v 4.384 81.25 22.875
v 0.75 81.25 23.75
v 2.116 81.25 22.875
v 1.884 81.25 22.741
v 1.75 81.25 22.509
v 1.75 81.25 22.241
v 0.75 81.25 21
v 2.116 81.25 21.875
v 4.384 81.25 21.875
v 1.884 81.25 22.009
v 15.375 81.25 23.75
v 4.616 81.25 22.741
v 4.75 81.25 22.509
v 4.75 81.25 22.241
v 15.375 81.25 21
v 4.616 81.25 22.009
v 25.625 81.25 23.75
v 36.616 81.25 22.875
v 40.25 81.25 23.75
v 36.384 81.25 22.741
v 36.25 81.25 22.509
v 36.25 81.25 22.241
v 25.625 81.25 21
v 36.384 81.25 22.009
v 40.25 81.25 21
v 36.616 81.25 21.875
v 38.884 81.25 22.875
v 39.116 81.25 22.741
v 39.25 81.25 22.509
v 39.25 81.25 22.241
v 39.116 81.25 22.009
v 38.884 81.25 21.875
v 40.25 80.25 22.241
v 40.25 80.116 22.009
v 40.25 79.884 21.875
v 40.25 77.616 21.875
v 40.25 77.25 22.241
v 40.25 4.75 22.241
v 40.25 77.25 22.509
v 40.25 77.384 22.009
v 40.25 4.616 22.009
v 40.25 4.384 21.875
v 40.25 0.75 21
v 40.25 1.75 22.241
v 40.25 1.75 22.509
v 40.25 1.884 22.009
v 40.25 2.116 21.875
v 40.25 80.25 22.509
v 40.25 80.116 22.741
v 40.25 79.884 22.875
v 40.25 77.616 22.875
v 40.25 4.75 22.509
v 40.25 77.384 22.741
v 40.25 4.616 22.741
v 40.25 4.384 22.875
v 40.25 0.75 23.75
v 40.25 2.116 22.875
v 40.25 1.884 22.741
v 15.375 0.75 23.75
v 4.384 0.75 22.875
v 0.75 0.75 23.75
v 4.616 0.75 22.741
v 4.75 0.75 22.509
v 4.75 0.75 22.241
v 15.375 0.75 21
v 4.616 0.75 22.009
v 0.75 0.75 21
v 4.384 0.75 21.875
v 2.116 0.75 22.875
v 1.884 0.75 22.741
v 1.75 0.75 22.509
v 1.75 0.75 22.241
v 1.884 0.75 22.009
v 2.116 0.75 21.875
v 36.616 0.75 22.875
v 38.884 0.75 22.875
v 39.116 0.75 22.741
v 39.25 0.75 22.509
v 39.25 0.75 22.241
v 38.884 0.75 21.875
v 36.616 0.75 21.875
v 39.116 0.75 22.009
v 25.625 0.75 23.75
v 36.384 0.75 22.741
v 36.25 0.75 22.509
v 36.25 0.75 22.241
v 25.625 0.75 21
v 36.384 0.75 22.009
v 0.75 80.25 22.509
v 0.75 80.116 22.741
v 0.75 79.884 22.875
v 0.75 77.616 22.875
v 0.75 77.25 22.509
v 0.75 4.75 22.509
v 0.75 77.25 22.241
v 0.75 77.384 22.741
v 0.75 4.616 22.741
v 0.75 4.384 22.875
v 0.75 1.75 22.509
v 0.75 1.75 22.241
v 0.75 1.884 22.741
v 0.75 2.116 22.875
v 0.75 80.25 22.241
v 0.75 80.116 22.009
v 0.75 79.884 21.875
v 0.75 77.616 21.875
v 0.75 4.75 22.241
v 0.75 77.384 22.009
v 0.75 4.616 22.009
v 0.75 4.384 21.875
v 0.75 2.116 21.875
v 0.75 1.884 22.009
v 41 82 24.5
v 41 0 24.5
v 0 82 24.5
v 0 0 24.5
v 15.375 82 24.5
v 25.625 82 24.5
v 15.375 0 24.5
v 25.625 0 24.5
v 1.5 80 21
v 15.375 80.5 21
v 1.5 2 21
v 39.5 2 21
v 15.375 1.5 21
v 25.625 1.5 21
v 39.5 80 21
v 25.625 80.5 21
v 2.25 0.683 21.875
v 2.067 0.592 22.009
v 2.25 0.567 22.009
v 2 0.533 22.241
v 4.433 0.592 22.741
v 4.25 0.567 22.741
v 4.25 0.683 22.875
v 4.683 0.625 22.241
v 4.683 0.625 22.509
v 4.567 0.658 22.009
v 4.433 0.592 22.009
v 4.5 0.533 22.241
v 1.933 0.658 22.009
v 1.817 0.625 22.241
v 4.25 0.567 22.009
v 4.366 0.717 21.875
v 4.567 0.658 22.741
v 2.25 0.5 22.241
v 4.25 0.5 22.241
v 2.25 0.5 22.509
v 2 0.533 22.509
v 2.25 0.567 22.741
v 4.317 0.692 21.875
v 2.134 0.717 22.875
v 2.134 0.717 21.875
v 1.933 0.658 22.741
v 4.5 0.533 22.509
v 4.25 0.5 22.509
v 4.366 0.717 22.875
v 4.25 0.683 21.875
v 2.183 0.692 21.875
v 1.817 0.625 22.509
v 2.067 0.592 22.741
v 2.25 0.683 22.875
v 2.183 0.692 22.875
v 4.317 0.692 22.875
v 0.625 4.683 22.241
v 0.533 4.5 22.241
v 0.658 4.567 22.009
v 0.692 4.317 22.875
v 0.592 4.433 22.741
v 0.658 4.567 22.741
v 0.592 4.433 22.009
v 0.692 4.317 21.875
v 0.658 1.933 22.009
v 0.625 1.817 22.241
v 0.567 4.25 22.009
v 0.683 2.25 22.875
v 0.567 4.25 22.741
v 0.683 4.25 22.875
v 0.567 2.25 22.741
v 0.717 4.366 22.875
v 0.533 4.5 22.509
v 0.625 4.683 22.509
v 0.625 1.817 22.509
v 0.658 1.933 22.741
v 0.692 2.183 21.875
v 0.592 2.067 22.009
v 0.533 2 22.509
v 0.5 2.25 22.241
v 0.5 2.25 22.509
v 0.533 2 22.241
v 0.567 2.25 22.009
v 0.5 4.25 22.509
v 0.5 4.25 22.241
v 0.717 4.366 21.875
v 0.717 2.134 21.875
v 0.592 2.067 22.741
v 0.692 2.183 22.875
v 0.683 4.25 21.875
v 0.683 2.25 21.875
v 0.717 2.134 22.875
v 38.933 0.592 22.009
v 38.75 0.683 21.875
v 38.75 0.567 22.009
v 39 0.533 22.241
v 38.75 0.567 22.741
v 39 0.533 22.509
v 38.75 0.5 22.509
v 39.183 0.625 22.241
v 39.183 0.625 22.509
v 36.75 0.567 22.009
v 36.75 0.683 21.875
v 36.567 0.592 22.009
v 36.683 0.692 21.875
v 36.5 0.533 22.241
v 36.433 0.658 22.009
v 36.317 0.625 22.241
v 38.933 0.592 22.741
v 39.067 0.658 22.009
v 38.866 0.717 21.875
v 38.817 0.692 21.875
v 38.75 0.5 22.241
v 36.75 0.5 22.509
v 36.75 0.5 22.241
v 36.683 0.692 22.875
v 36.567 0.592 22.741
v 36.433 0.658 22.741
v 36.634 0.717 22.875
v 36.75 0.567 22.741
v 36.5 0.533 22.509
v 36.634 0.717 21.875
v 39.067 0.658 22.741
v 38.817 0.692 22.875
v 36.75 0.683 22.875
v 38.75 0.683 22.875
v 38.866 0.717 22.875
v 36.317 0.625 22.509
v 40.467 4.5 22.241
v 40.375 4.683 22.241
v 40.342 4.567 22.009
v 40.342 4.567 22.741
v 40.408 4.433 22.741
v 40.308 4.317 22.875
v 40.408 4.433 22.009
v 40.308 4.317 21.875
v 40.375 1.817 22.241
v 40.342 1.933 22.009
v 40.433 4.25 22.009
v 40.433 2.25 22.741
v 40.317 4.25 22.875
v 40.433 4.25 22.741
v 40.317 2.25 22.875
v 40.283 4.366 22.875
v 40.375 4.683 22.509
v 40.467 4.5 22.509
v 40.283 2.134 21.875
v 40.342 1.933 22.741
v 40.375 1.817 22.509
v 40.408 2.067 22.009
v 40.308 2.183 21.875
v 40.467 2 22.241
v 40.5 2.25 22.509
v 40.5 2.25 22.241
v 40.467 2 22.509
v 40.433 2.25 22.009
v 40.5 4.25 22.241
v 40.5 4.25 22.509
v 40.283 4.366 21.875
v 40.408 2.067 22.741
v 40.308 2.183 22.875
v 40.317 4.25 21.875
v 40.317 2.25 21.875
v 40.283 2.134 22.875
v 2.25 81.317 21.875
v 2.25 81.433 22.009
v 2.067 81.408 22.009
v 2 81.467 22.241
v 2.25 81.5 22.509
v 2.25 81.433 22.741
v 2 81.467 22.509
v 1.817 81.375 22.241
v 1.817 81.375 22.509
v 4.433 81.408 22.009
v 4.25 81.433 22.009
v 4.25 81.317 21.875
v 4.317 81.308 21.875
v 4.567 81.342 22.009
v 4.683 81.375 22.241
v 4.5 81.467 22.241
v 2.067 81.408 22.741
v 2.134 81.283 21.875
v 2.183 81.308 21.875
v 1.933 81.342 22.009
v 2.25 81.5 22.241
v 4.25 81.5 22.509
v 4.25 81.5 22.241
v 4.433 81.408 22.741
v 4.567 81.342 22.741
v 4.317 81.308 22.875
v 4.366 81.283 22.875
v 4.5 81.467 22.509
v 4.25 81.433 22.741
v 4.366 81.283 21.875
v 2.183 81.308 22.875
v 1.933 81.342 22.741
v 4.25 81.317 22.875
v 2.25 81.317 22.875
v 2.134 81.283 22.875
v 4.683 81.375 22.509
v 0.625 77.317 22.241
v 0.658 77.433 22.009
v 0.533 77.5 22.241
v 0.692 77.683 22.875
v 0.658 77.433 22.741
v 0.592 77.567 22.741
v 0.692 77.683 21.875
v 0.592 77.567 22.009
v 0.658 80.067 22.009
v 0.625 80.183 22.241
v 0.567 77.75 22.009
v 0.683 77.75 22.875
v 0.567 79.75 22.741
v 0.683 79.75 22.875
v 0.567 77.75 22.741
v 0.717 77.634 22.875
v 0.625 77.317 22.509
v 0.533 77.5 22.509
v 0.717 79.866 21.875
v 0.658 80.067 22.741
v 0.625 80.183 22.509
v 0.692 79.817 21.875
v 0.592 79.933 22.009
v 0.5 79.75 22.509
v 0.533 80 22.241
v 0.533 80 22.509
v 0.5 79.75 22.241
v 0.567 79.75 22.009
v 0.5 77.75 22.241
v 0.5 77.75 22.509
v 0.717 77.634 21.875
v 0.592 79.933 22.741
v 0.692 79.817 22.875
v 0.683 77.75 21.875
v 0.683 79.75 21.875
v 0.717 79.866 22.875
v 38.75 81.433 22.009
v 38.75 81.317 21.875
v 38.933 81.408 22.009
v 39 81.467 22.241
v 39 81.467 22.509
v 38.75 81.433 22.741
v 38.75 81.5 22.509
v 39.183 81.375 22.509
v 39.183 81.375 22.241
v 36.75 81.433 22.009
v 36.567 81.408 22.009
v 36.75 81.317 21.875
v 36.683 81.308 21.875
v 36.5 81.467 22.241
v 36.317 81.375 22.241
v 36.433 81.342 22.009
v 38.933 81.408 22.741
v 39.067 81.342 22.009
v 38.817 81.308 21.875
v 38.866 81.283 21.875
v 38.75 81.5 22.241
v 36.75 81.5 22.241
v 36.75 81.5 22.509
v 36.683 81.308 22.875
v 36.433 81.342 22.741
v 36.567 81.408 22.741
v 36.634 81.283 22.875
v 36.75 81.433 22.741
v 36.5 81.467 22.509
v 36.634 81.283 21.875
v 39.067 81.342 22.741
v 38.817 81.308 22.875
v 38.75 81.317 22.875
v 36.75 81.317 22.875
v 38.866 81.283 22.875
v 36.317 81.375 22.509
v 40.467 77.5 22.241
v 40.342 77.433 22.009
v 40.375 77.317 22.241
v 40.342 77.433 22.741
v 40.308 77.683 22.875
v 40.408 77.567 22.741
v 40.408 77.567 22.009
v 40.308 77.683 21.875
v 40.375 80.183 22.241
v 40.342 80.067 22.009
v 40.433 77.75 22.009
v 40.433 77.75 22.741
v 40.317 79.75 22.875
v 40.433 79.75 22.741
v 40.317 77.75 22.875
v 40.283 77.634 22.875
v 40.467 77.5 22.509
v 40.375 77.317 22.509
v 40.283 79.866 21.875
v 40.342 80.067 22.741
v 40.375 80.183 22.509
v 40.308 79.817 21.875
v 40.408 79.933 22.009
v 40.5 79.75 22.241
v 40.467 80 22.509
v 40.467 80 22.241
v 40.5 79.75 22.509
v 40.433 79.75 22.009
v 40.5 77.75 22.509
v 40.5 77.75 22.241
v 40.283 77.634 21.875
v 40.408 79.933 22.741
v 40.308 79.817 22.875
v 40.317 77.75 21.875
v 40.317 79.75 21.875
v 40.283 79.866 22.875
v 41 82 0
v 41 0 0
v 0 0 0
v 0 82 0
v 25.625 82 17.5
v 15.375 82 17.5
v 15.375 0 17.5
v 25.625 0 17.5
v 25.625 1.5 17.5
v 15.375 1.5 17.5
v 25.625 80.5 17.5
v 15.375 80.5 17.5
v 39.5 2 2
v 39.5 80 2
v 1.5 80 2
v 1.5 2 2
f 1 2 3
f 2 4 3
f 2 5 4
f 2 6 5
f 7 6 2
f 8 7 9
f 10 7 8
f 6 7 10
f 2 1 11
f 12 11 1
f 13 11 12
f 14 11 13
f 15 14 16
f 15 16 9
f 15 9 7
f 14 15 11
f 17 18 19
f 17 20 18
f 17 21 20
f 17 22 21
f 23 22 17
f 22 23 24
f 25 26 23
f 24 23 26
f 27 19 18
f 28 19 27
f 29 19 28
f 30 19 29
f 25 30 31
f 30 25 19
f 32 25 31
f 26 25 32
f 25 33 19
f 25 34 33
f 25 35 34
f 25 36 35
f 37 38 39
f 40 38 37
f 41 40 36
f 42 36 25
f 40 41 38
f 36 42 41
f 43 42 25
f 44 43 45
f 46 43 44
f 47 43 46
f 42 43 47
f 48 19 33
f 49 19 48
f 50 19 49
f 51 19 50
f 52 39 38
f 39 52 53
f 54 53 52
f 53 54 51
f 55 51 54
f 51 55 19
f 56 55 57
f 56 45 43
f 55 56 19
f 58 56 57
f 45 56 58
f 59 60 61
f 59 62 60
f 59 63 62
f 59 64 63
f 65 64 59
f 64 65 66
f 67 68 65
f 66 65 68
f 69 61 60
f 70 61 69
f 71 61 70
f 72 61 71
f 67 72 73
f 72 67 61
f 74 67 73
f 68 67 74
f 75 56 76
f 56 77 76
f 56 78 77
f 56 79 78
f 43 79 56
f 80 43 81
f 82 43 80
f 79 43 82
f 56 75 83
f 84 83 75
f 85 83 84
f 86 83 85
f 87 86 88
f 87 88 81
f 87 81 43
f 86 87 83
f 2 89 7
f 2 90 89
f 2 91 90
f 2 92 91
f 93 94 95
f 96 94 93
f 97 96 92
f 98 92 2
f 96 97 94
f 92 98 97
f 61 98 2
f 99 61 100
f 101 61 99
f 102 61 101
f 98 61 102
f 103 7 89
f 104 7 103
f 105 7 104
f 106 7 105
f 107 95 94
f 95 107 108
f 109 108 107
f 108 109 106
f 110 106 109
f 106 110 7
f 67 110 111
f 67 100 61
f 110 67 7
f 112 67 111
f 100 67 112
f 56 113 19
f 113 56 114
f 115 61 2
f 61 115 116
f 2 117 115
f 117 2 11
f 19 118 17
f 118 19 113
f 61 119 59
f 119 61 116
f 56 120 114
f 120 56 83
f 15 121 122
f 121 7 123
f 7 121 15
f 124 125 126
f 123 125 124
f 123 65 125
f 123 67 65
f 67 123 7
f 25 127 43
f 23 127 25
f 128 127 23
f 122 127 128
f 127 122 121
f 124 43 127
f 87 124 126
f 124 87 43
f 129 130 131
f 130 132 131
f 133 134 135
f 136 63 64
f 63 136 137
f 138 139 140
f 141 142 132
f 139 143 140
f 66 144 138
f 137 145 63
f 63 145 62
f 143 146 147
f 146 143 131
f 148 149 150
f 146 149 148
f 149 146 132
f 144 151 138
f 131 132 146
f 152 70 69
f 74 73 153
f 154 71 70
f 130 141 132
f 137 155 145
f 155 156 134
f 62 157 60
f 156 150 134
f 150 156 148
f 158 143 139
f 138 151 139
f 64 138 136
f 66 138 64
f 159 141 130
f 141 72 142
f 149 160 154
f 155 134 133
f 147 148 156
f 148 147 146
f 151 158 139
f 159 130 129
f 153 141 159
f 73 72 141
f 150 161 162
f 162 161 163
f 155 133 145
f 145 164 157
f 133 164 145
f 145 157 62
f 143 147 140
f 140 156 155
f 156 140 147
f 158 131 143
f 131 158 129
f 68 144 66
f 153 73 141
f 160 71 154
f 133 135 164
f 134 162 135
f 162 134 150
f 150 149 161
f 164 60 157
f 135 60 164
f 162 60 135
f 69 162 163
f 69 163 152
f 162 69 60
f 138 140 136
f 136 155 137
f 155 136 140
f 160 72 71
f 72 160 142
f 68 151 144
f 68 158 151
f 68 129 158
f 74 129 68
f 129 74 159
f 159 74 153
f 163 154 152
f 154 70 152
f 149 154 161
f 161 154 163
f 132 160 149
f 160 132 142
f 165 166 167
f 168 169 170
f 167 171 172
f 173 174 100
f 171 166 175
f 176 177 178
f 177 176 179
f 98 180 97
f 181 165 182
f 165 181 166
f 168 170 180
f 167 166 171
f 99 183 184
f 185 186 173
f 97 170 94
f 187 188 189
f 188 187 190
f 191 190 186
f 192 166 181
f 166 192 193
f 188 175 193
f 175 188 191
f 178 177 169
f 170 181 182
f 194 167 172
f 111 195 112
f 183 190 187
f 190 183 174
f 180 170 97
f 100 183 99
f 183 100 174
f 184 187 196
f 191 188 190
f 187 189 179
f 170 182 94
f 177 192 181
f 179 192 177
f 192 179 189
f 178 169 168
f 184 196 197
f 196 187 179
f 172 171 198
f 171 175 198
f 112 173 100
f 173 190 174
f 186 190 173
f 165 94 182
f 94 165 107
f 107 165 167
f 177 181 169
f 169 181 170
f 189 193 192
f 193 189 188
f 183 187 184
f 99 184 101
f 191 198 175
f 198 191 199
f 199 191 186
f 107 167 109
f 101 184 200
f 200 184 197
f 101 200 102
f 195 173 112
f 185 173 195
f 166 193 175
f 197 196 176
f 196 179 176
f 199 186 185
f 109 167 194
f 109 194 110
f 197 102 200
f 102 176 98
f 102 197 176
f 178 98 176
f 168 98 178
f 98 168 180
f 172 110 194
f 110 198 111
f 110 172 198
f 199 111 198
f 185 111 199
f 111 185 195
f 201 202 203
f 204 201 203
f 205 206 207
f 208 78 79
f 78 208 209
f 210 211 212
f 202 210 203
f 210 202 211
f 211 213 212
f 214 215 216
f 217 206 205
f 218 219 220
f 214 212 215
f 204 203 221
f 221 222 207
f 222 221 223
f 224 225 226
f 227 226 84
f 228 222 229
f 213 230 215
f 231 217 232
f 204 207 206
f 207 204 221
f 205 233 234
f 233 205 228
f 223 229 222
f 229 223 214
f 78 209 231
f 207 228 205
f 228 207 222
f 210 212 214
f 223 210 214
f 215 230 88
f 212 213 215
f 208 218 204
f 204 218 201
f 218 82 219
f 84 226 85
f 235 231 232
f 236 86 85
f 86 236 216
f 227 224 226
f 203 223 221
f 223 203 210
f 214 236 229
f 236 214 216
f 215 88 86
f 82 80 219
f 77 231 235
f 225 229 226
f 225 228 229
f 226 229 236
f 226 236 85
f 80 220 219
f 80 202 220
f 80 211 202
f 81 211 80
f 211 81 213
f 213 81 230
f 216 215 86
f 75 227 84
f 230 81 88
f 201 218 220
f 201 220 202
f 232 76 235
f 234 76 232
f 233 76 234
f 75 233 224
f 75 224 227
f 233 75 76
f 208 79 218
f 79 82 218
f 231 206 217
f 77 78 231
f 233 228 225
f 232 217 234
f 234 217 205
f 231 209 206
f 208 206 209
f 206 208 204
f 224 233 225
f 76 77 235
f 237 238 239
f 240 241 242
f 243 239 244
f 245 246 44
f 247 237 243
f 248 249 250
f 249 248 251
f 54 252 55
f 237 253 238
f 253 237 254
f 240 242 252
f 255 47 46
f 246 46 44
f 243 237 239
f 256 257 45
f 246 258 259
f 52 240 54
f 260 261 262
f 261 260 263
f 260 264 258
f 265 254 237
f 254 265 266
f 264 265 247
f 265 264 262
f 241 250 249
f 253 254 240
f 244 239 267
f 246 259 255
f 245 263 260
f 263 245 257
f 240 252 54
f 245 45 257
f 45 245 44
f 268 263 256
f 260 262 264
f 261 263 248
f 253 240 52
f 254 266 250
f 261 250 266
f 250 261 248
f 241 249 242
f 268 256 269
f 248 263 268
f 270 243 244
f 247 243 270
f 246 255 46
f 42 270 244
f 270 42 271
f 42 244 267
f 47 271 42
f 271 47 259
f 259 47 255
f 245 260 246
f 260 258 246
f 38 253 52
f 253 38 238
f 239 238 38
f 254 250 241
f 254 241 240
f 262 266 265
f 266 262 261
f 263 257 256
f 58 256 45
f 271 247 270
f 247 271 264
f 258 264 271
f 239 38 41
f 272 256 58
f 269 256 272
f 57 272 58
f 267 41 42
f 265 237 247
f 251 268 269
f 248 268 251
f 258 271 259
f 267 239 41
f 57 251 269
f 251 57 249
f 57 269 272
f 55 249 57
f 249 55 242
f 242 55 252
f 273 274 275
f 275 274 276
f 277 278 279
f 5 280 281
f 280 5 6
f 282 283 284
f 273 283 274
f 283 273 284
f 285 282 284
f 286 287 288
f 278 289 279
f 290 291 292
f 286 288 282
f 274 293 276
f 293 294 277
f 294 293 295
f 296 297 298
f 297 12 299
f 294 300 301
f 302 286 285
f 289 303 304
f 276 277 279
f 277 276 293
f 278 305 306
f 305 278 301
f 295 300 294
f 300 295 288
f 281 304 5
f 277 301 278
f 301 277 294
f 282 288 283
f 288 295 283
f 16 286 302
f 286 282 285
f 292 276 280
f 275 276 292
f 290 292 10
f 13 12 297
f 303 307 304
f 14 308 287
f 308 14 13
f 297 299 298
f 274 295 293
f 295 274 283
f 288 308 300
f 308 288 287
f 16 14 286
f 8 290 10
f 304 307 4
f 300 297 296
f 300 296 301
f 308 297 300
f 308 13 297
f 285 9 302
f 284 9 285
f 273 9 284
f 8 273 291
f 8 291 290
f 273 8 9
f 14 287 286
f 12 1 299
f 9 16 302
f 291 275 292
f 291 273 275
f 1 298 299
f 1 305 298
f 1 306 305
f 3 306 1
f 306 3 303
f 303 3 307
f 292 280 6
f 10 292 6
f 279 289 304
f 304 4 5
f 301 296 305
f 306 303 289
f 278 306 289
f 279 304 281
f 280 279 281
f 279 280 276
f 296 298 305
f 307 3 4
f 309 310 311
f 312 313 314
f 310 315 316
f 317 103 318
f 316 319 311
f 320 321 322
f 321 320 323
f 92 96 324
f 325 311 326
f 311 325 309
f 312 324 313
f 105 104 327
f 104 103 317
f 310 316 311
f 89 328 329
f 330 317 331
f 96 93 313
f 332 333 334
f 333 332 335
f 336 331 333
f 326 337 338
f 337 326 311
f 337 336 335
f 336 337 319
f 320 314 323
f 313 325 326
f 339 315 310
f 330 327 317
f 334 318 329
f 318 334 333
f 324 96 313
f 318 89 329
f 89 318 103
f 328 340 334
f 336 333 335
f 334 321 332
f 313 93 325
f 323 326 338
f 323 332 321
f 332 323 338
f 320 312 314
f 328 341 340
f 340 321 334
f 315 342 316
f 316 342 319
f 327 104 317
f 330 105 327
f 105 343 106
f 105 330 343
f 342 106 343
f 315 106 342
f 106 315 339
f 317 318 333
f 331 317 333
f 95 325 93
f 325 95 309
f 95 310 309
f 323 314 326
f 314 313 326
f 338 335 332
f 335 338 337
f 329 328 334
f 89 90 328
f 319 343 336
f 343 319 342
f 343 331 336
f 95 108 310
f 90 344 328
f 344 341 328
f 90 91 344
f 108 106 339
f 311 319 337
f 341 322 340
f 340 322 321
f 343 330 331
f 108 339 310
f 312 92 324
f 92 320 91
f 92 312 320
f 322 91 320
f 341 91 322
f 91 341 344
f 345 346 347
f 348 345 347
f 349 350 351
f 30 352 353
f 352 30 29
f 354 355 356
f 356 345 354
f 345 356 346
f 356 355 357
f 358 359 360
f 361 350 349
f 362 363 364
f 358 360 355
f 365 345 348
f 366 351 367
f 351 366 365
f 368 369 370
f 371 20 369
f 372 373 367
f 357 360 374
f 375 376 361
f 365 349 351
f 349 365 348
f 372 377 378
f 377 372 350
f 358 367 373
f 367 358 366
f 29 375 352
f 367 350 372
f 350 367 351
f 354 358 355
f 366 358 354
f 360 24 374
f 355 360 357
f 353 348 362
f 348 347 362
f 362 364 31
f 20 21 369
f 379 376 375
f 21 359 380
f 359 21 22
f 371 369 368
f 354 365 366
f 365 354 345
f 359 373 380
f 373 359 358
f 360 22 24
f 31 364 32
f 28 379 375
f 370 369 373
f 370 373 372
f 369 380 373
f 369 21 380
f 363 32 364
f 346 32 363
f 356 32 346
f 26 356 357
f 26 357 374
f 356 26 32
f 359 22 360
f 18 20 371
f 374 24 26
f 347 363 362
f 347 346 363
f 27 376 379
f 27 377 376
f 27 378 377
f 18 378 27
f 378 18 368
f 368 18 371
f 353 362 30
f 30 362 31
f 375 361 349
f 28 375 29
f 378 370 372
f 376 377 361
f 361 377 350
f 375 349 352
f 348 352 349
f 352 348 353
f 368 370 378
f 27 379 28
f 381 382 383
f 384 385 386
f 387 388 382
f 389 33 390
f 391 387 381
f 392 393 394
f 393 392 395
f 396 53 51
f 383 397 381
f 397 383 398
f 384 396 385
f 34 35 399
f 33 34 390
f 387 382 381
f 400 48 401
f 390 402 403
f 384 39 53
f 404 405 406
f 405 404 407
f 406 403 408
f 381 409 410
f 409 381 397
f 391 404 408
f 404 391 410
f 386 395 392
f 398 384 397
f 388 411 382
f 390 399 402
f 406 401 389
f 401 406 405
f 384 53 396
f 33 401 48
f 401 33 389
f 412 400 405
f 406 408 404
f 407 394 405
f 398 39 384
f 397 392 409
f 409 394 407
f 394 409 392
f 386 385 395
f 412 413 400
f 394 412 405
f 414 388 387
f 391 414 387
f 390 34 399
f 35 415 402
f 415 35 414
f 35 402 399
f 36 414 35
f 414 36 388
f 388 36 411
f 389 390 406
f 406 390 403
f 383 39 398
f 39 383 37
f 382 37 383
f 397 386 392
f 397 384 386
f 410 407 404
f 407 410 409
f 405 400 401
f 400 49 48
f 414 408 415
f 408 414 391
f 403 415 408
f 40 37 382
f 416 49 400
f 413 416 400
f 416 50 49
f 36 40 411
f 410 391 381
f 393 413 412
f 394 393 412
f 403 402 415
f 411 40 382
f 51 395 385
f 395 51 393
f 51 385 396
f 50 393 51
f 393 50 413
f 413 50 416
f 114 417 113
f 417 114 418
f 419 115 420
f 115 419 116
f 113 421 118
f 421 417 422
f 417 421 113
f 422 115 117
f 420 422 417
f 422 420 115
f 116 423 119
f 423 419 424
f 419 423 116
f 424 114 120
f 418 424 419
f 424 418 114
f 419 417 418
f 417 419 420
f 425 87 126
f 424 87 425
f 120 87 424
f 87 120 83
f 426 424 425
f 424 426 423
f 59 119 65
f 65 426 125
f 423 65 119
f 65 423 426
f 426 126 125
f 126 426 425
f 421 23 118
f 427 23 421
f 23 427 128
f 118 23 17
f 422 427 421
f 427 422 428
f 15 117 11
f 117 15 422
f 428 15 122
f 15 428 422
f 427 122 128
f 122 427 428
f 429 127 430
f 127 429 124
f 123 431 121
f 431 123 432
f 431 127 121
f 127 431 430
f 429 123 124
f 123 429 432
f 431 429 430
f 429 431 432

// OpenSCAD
include <boardgame_insert_toolkit_lib.bill.scad>;

// determines whether lids are output.
g_b_print_lid = f;

// determines whether boxes are output.
g_b_print_box = t; 

// Focus on one box
g_isolated_print_box = ""; 

g_b_fit_test = f;

function lid_parms( radius, tabs = [ f,f,f,f] ) = 
[
    [ LID_PATTERN_RADIUS,         radius ],        
    [ LID_LABELS_BG_THICKNESS, 4],
    [ LID_INSET_B, t ],
    [ LID_TABS_4B, tabs],

    [ LID_PATTERN_N1,               7 ],
    [ LID_PATTERN_N2,               7 ],
    [ LID_PATTERN_ANGLE,            25.7 ],
    [ LID_PATTERN_ROW_OFFSET,       10 ],
    [ LID_PATTERN_COL_OFFSET,       140 ],
    [ LID_PATTERN_THICKNESS,        0.6 ],

 ];

//////////////////

10s = 35;
5s = 37;
2s = 42;
1s = 50;

data =
[
    
    [ "Spice Bank",
    
        [
            [ BOX_SIZE_XYZ, [41, 82, 21] ],

            [ BOX_LID,
                [
                    [ LID_PATTERN_RADIUS,4],        
                    [ LID_INSET_B, t ],
                    [ LID_TABS_4B, [ t,t,f,f]],
                    [ LID_FIT_UNDER_B, f],
                    [ LID_LABELS_INVERT_B, t],
                    [ LABEL,
                        [
                            [ LBL_TEXT,     "SHAI - HULUD" ],
                            [ LBL_SIZE,     AUTO ],
                            [ ROTATION,     90 ],
                            [ LBL_FONT,     "Orthodox Herbertarian:style=Regular"],
                        ]
                    ],
                ],
            ],
            [ BOX_COMPONENT,
                [
                    [CMP_COMPARTMENT_SIZE_XYZ,                [ 38, 78, 19] ],
                    //[CMP_SHAPE,                             SQAURE],
                    [POSITION_XY,                           [CENTER, CENTER ] ],         
                ]
            ],
        ],
    ],
];


MakeAll();
